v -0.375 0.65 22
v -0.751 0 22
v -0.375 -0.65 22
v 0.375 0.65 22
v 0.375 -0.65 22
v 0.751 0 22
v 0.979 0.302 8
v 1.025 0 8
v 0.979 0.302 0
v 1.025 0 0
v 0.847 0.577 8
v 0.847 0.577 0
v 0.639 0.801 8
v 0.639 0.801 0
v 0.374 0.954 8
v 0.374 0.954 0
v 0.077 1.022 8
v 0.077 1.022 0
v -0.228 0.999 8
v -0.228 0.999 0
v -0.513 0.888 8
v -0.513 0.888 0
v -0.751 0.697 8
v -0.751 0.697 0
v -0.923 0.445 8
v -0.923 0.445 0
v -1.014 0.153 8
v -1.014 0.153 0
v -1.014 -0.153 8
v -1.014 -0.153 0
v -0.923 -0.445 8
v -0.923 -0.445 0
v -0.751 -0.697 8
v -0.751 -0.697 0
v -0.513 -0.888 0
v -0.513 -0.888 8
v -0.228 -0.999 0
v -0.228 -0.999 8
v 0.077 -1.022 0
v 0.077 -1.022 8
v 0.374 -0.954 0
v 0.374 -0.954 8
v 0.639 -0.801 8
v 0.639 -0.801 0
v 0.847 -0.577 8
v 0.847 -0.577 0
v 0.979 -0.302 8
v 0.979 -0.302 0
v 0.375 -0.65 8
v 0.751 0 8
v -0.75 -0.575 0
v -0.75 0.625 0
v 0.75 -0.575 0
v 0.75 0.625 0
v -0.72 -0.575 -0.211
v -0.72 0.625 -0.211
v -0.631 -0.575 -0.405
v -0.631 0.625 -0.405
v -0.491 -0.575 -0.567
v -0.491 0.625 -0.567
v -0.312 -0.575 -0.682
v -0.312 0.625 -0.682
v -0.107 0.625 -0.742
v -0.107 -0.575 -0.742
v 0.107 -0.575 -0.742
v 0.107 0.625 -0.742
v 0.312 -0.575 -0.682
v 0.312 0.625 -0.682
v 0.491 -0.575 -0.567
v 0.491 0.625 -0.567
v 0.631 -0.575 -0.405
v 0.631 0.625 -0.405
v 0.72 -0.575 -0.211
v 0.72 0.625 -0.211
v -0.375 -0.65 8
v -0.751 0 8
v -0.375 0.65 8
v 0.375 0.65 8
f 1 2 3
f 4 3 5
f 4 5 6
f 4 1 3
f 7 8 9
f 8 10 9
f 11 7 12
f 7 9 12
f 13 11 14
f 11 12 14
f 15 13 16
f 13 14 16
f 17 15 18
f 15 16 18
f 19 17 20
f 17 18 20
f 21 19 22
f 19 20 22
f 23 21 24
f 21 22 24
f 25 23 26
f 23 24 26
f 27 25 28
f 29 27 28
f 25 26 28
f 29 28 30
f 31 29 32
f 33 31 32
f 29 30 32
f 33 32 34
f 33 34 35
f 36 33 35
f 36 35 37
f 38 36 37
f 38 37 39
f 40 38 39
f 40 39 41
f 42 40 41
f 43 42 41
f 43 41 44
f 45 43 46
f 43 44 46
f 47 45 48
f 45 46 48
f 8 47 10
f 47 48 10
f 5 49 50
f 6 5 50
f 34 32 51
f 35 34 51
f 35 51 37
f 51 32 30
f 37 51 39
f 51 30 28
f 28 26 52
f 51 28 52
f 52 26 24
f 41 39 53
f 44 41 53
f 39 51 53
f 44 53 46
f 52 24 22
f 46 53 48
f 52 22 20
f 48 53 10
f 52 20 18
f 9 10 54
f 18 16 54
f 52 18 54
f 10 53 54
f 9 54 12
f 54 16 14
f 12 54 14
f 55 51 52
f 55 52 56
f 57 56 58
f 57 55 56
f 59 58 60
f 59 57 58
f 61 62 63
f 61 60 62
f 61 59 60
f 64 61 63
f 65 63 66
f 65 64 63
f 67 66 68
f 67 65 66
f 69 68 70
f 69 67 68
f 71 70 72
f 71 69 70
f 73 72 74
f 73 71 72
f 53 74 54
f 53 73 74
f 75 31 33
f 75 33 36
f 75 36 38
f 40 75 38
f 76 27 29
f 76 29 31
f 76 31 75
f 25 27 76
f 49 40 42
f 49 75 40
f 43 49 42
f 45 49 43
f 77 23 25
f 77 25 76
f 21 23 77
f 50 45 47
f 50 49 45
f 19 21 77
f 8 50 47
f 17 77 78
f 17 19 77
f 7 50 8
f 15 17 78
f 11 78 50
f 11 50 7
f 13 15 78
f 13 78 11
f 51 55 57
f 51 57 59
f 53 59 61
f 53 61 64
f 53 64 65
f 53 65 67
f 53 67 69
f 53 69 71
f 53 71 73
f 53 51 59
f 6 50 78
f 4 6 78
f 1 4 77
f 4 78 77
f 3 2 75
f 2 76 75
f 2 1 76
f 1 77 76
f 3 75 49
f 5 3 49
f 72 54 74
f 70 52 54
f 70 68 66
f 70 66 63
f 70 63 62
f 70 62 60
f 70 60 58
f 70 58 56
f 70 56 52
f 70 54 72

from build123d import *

# Parameters (mm, degrees)
SKETCH1_R                = 1.025
BOSS_EXTRUDE1_DEPTH      = 5
BOSS_EXTRUDE5_DEPTH      = 0.25
BOSS_EXTRUDE5_DEPTH_BACK = 0.2
BOSS_EXTRUDE6_DEPTH      = 0.375
BOSS_EXTRUDE7_START      = 0.375
BOSS_EXTRUDE7_DEPTH      = 0.375
BOSS_EXTRUDE9_DEPTH      = 14
SKETCH7_R                = 1.025
BOSS_EXTRUDE10_DEPTH     = 3
BOSS_EXTRUDE11_DEPTH     = 3


with BuildPart() as part:
    # Sketch1 → Boss-Extrude1 (new body)
    with BuildSketch(Plane.XY):
        Circle(SKETCH1_R)
    extrude(amount=BOSS_EXTRUDE1_DEPTH)

    # Sketch3 → Boss-Extrude5 (add, two sides: drawn at the far end of the back side and taken through both)
    with BuildSketch(Plane(origin=(0, 0, 0), x_dir=(1, 0, 0), z_dir=(0, 1, 0)).offset(-BOSS_EXTRUDE5_DEPTH_BACK)):
        with BuildLine():
            Line((-0.75, 0), (0.75, 0))
            ThreePointArc((0.75, 0), (0, 0.75), (-0.75, 0))
        make_face()
    extrude(amount=BOSS_EXTRUDE5_DEPTH + BOSS_EXTRUDE5_DEPTH_BACK)

    # Sketch5 → Boss-Extrude6 (add)
    with BuildSketch(Plane(origin=(0, 0.25, 0), x_dir=(1, 0, 0), z_dir=(0, 1, 0))):
        with BuildLine():
            Line((-0.75, 0), (0.75, 0))
            ThreePointArc((0.75, 0), (0, 0.75), (-0.75, 0))
        make_face()
    extrude(amount=BOSS_EXTRUDE6_DEPTH)

    # Sketch6 → Boss-Extrude7 (add)
    with BuildSketch(Plane.XZ.offset(0.2).offset(BOSS_EXTRUDE7_START)):
        with BuildLine():
            Line((0.75, 0), (-0.75, 0))
            ThreePointArc((-0.75, 0), (0, -0.75), (0.75, 0))
        make_face()
    extrude(amount=-BOSS_EXTRUDE7_DEPTH)

    # Sketch2 → Boss-Extrude9 (add)
    with BuildSketch(Plane.XY.offset(5)):
        Polygon((0.75055535, 0), (0.375277675, 0.65), (-0.375277675, 0.65), (-0.75055535, 0), (-0.375277675, -0.65), (0.375277675, -0.65), align=None)
    extrude(amount=BOSS_EXTRUDE9_DEPTH)

    # Sketch7 → Boss-Extrude10 (add)
    with BuildSketch(Plane.XY.offset(5)):
        Circle(SKETCH7_R)
    extrude(amount=BOSS_EXTRUDE10_DEPTH)

    # Sketch8 → Boss-Extrude11 (add)
    with BuildSketch(Plane.XY.offset(19)):
        Polygon((0.75055535, 0), (0.375277675, 0.65), (-0.375277675, 0.65), (-0.75055535, 0), (-0.375277675, -0.65), (0.375277675, -0.65), align=None)
    extrude(amount=BOSS_EXTRUDE11_DEPTH)


solid = part.part
